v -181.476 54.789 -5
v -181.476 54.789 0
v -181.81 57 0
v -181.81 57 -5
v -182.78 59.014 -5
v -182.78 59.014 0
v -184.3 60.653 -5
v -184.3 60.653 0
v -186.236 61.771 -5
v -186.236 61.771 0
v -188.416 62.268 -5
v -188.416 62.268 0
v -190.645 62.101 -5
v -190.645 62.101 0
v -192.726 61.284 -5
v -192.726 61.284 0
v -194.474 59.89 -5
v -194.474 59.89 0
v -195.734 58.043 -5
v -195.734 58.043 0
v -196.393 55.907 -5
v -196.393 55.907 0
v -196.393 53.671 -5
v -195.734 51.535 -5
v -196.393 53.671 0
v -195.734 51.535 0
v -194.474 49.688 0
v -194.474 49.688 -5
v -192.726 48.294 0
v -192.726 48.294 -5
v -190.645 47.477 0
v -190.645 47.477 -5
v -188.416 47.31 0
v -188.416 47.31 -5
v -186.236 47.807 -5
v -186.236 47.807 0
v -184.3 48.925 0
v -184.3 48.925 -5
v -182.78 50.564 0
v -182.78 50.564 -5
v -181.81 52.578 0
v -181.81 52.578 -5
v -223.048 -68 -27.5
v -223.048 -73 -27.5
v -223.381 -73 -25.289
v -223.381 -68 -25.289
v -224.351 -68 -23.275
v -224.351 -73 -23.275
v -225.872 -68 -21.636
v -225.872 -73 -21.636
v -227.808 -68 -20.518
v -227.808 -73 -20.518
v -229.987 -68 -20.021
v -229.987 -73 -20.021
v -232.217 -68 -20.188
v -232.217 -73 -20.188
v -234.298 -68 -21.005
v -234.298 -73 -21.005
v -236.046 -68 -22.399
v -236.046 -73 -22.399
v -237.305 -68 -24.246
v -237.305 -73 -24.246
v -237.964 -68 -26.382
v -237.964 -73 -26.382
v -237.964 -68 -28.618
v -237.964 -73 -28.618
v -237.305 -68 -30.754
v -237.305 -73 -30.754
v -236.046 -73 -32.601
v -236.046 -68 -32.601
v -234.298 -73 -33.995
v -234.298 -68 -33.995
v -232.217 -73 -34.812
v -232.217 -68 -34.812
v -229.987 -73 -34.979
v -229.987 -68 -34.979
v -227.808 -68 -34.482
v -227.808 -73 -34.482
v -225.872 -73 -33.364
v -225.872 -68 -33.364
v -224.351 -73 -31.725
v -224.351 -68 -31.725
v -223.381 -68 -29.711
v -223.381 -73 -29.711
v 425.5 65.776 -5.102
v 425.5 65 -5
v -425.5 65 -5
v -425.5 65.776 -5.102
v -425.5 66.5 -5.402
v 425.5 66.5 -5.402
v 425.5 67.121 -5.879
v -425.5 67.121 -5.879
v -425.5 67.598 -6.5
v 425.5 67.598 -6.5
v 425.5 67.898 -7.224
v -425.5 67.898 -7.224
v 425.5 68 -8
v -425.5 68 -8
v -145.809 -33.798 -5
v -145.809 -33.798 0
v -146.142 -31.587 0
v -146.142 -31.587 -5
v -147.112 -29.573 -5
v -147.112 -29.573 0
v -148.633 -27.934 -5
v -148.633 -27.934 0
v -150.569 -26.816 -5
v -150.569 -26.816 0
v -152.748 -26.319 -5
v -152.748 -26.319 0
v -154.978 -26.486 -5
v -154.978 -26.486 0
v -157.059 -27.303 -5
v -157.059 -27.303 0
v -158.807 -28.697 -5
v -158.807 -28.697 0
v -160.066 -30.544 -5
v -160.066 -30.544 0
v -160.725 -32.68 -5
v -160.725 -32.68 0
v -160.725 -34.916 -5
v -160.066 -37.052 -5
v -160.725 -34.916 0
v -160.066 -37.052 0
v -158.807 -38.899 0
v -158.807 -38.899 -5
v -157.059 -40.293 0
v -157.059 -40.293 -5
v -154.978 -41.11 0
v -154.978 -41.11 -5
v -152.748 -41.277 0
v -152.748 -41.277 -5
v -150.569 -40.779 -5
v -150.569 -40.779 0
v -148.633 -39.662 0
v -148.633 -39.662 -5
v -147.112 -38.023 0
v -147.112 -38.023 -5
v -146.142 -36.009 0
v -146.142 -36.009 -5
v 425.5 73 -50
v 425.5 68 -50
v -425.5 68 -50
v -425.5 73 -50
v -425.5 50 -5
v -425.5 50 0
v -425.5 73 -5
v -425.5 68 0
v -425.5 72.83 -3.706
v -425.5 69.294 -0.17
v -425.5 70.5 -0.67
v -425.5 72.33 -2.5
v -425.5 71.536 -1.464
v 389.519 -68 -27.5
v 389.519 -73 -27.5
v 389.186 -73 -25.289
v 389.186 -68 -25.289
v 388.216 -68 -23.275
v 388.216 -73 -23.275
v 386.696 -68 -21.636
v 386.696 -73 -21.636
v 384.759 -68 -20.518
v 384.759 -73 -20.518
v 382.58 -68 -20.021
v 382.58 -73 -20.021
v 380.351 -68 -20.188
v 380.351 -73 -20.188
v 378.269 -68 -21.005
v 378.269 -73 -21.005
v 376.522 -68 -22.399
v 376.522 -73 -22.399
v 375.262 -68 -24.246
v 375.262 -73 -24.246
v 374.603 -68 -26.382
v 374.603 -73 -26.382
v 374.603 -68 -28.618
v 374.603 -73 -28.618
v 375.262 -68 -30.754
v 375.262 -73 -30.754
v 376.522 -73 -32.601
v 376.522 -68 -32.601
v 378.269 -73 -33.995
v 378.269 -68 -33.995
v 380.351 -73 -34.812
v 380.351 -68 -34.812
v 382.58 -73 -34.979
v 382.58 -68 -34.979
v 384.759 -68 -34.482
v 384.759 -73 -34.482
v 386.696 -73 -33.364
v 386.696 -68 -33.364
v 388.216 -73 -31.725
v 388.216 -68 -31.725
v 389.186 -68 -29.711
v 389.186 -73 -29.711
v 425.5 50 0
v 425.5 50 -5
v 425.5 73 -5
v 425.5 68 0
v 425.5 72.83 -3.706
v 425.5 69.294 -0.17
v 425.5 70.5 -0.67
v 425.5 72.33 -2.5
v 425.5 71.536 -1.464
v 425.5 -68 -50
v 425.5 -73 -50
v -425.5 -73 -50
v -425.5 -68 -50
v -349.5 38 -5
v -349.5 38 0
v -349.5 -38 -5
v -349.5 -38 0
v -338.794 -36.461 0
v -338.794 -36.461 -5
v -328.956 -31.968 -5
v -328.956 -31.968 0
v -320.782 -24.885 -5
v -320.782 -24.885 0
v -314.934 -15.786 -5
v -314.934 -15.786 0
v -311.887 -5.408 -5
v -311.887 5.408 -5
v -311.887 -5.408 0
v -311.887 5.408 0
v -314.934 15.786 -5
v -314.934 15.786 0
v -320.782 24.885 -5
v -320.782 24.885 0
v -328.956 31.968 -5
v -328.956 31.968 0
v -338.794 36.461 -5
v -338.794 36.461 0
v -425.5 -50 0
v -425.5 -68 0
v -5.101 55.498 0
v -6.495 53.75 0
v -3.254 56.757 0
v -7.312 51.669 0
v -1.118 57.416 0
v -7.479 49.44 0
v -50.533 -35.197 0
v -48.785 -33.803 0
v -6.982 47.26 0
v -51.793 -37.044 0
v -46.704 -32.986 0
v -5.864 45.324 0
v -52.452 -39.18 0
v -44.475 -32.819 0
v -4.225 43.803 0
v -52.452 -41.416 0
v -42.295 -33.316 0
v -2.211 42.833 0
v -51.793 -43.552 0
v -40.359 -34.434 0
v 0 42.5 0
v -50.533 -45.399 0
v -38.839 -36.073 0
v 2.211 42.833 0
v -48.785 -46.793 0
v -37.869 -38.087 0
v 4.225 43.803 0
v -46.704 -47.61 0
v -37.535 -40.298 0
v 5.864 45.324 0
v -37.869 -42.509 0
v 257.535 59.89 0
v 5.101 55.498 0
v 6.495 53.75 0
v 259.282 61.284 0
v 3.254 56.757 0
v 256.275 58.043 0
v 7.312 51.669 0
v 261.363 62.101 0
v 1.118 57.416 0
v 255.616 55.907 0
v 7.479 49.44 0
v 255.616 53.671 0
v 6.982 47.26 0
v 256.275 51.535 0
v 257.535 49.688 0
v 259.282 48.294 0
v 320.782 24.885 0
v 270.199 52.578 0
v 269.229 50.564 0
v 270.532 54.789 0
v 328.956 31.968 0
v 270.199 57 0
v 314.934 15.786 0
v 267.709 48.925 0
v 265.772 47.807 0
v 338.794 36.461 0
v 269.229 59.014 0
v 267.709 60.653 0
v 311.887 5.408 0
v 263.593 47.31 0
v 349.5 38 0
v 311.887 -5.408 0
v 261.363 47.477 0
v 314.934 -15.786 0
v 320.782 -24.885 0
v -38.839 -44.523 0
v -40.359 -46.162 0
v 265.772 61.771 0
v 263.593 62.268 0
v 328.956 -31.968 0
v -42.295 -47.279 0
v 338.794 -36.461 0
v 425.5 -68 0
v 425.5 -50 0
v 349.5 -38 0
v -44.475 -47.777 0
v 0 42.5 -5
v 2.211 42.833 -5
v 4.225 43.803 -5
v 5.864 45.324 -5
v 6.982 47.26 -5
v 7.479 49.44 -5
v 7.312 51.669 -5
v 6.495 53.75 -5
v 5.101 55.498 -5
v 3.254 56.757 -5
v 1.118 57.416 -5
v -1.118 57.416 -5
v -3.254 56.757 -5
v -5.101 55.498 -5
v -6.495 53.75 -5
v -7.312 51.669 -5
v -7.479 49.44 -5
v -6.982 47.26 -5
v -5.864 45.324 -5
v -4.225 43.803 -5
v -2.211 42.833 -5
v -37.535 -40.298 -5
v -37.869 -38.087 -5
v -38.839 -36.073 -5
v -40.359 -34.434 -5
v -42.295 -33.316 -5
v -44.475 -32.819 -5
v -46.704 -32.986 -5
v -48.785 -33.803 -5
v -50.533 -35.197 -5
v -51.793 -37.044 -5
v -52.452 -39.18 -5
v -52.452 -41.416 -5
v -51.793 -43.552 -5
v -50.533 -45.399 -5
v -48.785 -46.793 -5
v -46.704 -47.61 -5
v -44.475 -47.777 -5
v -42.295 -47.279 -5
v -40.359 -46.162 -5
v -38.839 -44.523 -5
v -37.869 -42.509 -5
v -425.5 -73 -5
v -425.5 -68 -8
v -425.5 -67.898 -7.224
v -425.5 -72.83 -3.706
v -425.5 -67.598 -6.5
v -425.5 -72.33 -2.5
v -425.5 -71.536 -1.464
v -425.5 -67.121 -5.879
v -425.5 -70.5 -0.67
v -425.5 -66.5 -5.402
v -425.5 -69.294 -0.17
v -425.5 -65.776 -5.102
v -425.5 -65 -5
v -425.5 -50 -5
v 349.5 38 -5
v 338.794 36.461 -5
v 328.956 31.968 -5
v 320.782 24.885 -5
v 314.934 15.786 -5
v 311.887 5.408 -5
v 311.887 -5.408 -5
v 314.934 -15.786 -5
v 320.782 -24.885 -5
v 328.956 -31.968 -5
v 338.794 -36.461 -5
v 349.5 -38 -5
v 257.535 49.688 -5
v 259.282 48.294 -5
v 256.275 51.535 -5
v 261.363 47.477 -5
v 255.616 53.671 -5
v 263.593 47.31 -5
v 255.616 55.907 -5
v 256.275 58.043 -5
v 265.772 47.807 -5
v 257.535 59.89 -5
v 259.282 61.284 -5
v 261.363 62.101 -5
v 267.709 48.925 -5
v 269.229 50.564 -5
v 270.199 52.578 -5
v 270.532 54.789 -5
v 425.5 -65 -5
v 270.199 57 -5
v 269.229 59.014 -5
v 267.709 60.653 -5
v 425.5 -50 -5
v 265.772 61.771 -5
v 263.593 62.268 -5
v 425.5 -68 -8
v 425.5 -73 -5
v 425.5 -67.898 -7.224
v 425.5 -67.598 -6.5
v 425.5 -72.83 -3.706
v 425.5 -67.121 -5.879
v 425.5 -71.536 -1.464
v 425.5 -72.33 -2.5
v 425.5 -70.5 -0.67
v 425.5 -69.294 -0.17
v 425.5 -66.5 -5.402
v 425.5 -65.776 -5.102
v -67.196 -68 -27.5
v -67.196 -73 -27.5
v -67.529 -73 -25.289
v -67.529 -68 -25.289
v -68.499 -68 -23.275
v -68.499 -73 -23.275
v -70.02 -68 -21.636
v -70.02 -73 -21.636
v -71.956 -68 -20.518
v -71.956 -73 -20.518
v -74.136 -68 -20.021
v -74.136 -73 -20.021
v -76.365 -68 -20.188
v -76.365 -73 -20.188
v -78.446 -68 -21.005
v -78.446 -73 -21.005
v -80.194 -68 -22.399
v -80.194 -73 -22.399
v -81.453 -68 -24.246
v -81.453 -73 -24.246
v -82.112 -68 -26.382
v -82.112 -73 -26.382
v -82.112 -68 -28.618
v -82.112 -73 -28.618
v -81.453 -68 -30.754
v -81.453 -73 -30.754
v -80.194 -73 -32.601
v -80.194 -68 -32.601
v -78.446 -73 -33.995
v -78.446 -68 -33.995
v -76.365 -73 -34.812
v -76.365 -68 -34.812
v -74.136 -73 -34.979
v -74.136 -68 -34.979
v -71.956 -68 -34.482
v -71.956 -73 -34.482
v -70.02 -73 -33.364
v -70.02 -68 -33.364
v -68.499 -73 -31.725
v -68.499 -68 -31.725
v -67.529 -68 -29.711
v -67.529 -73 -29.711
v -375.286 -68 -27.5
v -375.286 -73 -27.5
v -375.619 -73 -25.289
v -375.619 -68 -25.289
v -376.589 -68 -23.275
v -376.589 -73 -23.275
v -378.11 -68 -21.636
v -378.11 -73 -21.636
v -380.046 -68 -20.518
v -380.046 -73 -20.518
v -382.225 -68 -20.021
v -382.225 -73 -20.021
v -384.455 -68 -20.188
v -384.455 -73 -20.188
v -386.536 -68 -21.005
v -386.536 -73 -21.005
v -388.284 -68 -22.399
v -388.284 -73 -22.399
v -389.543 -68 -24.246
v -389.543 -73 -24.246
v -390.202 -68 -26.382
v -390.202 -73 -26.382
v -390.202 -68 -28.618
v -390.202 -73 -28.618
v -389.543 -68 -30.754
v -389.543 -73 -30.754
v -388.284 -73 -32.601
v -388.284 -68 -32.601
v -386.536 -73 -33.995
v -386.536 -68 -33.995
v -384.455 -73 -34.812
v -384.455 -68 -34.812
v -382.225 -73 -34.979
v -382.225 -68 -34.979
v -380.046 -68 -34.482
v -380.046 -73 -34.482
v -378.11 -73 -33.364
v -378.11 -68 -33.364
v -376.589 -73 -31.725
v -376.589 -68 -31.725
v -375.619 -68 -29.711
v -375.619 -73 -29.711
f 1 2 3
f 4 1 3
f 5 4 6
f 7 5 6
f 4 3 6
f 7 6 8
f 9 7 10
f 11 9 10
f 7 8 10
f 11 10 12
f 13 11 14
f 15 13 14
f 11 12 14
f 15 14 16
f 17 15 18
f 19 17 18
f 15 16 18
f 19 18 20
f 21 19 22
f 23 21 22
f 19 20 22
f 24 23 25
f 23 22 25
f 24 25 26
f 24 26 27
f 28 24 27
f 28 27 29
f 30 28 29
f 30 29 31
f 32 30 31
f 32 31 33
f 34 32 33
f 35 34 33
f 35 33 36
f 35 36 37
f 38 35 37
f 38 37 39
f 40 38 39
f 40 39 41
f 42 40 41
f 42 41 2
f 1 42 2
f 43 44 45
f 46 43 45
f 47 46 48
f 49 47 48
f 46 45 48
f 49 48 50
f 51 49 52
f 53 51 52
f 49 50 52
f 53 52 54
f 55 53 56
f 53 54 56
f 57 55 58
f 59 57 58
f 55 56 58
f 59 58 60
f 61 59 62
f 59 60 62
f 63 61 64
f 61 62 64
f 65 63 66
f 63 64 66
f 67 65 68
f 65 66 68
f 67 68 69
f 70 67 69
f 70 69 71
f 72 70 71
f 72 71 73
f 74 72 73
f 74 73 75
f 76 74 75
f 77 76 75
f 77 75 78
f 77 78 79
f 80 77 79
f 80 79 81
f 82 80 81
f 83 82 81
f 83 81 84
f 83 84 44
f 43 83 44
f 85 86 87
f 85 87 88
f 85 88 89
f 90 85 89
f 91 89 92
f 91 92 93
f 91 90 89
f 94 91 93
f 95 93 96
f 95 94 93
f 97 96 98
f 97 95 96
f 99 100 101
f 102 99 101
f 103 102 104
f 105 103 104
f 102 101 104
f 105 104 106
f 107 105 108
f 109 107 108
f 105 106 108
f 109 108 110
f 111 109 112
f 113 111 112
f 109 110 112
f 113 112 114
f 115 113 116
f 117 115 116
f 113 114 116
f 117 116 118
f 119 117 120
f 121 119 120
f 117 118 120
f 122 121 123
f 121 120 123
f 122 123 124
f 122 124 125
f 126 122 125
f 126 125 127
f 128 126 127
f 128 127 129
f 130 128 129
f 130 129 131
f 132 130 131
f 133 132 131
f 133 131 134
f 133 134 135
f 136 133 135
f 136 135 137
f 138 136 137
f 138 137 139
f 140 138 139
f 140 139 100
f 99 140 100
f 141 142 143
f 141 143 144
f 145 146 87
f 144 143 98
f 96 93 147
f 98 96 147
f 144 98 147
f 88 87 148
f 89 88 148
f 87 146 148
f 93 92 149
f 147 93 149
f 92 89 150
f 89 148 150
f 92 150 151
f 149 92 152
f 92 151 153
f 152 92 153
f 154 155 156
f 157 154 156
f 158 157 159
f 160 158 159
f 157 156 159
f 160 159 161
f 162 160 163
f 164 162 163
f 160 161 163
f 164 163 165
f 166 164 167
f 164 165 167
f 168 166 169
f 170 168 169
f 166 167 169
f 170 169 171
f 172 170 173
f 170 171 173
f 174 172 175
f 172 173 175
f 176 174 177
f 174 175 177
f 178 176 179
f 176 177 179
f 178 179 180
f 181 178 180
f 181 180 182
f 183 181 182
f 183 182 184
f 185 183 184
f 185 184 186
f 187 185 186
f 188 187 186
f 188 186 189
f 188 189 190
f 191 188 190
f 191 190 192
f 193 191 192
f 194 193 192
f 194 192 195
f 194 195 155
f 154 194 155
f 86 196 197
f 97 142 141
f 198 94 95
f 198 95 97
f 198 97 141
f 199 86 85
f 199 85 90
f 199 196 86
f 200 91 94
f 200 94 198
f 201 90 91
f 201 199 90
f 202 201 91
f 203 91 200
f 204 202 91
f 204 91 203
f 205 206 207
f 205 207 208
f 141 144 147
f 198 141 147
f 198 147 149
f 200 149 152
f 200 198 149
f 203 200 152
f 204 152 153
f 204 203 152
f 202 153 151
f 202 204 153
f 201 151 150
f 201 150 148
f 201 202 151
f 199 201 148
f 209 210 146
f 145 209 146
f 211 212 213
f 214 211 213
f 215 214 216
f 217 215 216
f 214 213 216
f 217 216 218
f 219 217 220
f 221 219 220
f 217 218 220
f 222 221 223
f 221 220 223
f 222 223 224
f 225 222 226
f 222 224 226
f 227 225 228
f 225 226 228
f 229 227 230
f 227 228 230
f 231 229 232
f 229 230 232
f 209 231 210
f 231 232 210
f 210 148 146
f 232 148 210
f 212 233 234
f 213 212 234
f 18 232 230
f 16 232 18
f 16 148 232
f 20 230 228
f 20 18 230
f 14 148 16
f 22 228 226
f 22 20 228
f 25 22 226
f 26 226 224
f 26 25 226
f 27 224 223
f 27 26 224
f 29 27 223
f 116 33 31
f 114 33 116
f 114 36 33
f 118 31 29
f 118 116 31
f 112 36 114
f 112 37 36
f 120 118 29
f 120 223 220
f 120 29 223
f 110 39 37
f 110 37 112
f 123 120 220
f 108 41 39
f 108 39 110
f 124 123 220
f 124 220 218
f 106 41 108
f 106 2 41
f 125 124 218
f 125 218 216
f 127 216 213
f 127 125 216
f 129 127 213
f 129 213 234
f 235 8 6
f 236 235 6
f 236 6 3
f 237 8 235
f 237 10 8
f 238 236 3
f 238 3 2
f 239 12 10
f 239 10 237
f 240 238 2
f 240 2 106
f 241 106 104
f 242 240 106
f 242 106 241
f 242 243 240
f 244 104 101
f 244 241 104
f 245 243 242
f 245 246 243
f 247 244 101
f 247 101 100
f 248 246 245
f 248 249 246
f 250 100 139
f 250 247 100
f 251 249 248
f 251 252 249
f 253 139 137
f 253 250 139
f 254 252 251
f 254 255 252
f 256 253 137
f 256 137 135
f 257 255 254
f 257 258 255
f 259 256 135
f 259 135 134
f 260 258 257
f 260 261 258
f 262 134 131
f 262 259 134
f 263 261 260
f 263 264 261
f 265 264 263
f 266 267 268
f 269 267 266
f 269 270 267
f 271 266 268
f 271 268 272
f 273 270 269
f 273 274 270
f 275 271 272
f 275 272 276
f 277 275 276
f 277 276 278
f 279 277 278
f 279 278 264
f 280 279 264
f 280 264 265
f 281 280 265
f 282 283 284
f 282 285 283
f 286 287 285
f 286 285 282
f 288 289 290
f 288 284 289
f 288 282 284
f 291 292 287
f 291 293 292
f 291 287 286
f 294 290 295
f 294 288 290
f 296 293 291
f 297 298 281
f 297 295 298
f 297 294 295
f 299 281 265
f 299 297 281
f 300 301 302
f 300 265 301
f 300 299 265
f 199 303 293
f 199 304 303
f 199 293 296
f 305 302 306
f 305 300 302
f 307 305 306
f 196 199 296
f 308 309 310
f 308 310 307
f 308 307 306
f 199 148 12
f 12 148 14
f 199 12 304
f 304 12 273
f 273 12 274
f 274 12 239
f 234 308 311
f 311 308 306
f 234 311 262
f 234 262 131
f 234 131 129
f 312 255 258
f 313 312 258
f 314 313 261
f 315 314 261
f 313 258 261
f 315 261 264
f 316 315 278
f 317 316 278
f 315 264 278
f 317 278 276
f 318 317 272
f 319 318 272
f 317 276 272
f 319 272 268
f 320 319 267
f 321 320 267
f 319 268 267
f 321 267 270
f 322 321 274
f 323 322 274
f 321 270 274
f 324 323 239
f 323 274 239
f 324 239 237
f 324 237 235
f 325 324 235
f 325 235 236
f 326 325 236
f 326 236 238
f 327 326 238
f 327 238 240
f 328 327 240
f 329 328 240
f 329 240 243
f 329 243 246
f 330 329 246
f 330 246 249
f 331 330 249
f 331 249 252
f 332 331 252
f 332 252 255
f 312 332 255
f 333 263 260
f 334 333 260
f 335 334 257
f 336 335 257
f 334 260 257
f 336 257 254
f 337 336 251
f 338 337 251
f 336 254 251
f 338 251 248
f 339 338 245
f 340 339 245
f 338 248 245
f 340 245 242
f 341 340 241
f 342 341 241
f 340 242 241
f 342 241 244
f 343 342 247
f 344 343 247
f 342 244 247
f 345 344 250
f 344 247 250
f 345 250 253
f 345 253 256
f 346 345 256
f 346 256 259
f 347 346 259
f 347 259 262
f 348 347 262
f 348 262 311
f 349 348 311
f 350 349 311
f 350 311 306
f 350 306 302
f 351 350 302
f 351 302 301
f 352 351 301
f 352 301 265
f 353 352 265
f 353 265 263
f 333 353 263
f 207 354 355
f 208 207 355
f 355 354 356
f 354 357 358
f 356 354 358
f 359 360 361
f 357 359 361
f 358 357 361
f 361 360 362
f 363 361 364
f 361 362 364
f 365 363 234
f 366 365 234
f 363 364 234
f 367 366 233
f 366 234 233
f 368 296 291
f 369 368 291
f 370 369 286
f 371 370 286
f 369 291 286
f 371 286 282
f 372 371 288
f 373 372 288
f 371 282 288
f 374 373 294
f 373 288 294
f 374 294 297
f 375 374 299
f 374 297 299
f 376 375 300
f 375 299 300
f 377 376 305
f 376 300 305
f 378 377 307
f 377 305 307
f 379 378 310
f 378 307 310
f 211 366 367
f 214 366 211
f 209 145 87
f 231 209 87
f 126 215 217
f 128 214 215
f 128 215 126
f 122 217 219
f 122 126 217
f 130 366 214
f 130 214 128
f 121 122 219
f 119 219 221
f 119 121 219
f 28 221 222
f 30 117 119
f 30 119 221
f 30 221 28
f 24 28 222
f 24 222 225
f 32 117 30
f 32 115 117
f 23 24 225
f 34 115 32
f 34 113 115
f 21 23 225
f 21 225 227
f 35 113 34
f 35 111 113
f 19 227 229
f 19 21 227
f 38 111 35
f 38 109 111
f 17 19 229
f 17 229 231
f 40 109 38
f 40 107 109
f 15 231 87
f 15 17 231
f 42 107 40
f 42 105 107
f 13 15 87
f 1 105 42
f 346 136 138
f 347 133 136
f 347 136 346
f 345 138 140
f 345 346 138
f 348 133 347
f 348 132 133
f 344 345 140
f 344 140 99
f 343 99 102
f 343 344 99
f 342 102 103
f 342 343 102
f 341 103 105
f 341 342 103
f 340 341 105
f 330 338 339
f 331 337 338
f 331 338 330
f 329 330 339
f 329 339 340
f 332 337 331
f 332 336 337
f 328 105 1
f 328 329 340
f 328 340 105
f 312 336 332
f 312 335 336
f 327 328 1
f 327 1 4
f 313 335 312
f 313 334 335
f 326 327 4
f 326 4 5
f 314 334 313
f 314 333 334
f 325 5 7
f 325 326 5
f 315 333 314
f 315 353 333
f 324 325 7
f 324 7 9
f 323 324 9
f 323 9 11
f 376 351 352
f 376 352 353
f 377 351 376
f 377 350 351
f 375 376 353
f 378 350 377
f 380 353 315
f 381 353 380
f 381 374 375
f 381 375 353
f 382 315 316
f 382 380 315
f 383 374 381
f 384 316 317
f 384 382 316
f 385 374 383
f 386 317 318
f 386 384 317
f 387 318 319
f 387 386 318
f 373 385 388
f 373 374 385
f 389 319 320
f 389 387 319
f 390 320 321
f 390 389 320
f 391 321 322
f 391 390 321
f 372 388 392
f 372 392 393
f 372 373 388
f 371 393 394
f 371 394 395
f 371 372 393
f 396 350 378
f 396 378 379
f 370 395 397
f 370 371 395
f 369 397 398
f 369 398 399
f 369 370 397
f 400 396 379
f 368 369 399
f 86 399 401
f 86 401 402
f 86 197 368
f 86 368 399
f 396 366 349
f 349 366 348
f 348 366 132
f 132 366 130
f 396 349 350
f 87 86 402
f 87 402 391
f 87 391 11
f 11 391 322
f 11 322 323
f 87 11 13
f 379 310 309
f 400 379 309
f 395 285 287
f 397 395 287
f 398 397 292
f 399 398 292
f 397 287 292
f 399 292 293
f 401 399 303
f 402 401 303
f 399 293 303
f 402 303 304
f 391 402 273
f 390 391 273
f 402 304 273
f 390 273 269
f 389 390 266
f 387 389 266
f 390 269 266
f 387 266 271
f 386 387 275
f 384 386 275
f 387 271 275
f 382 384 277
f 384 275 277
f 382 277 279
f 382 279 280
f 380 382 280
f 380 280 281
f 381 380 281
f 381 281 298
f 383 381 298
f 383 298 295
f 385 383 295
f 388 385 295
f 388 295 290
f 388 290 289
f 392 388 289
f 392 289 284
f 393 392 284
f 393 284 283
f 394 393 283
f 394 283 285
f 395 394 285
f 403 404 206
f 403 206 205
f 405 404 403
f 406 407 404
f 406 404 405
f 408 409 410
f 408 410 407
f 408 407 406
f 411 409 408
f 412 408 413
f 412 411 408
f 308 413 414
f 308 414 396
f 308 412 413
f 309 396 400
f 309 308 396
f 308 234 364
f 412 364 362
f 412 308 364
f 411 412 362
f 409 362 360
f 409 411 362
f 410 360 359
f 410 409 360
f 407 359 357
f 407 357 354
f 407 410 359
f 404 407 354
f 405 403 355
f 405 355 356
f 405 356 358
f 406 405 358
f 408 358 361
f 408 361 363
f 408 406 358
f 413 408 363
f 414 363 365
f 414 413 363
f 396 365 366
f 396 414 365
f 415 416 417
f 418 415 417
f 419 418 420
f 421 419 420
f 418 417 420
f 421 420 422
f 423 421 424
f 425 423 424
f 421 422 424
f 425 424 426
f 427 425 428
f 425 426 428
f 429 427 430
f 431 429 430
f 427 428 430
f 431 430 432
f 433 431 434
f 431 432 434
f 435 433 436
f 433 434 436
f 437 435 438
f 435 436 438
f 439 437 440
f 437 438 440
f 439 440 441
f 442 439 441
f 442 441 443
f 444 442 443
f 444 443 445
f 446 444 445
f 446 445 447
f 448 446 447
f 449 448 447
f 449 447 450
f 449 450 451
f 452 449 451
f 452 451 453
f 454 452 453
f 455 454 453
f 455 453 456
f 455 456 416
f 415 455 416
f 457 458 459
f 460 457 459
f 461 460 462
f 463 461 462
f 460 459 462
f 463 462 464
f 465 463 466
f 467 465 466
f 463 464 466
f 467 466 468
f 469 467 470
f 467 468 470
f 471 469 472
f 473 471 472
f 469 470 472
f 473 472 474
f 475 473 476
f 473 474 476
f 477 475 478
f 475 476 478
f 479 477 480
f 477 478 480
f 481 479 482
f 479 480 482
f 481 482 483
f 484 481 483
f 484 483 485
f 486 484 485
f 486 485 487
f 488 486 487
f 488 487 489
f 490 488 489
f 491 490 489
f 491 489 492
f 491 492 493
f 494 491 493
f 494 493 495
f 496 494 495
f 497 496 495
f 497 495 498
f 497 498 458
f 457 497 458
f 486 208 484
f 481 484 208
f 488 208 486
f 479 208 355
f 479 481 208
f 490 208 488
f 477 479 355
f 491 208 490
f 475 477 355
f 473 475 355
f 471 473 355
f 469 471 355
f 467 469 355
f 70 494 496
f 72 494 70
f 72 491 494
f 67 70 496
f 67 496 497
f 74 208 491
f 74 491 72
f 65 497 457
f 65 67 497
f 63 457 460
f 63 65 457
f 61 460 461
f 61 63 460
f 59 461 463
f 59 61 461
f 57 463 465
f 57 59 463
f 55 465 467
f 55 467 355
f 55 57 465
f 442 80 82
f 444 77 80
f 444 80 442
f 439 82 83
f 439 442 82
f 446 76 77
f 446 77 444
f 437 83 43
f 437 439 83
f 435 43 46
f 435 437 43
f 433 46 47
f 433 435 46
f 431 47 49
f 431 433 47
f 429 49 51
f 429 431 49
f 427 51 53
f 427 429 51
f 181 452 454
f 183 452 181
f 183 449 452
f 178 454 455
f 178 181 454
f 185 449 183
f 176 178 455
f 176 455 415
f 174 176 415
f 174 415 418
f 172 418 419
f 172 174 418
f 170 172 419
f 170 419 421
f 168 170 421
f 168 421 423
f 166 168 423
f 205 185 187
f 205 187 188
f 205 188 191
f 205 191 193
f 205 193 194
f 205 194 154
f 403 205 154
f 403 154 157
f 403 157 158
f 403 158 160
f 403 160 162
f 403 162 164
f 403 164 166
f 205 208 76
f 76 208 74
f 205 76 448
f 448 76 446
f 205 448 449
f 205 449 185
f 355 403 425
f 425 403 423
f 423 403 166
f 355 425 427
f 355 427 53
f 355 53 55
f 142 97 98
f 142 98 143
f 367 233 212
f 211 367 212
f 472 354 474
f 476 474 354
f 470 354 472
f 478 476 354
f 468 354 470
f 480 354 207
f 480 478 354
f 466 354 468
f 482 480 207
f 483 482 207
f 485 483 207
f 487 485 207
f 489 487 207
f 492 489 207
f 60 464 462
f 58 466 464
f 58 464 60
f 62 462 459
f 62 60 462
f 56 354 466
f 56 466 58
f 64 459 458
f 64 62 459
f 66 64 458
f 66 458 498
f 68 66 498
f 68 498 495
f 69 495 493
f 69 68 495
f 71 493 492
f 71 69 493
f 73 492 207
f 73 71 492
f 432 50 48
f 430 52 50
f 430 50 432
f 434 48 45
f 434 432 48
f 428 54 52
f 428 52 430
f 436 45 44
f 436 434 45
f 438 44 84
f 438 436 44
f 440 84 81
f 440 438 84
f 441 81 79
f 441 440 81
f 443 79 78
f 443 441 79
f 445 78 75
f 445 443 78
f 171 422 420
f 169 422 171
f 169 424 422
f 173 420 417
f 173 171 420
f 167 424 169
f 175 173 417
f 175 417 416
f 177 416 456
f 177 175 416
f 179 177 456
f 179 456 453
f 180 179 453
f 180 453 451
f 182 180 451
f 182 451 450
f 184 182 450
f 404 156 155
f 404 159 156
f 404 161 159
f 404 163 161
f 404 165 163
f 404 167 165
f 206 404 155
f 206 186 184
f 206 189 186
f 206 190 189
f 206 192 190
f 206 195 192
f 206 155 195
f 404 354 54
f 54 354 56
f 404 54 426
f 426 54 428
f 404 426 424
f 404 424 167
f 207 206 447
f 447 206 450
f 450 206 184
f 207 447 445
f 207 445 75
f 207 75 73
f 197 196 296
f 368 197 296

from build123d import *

# Parameters (mm, degrees)
F1_DEPTH = 425.5
F2_R     = 7.5
F3_DEPTH = 81
F4_R     = 7.5
F5_DEPTH = 25


# Not quite as in the source:
# - a feature names something its author has since deleted; it is built from what else it names


with BuildPart() as f1:
    # F0 (on Right) → F1 (new body, symmetric)
    with BuildSketch(Plane.YZ):
        with BuildLine():
            Line((68, 0), (0, 0))
            Line((0, 0), (0, -5))
            Line((0, -5), (65, -5))
            ThreePointArc((65, -5), (67.1213203436, -5.8786796564), (68, -8))
            Line((68, -8), (68, -50))
            Line((68, -50), (73, -50))
            Line((73, -50), (73, -5))
            ThreePointArc((73, -5), (71.5355339059, -1.4644660941), (68, 0))
        make_face()
        with BuildLine():
            Line((0, -5), (0, 0))
            Line((0, 0), (-68, 0))
            ThreePointArc((-68, 0), (-71.5355339059, -1.4644660941), (-73, -5))
            Line((-73, -5), (-73, -50))
            Line((-73, -50), (-68, -50))
            Line((-68, -50), (-68, -8))
            ThreePointArc((-68, -8), (-67.1213203436, -5.8786796564), (-65, -5))
            Line((-65, -5), (0, -5))
        make_face()
    extrude(amount=F1_DEPTH, both=True)

    # F2 (on face) → F3 (cut)
    with BuildSketch(Plane.XY):
        with BuildLine():
            Line((-349.5, 38), (-425.5, 50))
            Line((-425.5, 50), (-425.5, 0))
            Line((-425.5, 0), (-425.5, -50))
            Line((-425.5, -50), (-349.5, -38))
            ThreePointArc((-349.5, -38), (-311.5, 0), (-349.5, 38))
        make_face()
        with BuildLine():
            ThreePointArc((0, 57.5), (-7.5, 50), (0, 42.5))
            Line((0, 42.5), (0, 57.5))
        make_face()
        with BuildLine():
            Line((0, 57.5), (0, 42.5))
            ThreePointArc((0, 42.5), (5.3033008589, 44.6966991411), (7.5, 50))
            ThreePointArc((7.5, 50), (5.3033008589, 55.3033008589), (0, 57.5))
        make_face()
        with BuildLine():
            ThreePointArc((349.5, 38), (311.5, 0), (349.5, -38))
            Line((349.5, -38), (425.5, -50))
            Line((425.5, -50), (425.5, 50))
            Line((425.5, 50), (349.5, 38))
        make_face()
        with Locations((-188.9763474464, 54.7889843583)):
            Circle(F2_R)
        with Locations((263.0324065685, 54.7889843583)):
            Circle(F2_R)
        with Locations((-153.3087122573, -33.7979345426)):
            Circle(F2_R)
        with Locations((-45.0354404747, -40.2978882194)):
            Circle(F2_R)
    extrude(amount=-F3_DEPTH, mode=Mode.SUBTRACT)

    # F4 (on face) → F5 (cut)
    with BuildSketch(Plane.XZ.offset(73)):
        with Locations((-382.7857971191, -27.5)):
            Circle(F4_R)
        with Locations((382.0194303989, -27.5)):
            Circle(F4_R)
        with Locations((-230.5479198694, -27.5)):
            Circle(F4_R)
        with Locations((-74.6961683035, -27.5)):
            Circle(F4_R)
    extrude(amount=-F5_DEPTH, mode=Mode.SUBTRACT)


solid = f1.part
